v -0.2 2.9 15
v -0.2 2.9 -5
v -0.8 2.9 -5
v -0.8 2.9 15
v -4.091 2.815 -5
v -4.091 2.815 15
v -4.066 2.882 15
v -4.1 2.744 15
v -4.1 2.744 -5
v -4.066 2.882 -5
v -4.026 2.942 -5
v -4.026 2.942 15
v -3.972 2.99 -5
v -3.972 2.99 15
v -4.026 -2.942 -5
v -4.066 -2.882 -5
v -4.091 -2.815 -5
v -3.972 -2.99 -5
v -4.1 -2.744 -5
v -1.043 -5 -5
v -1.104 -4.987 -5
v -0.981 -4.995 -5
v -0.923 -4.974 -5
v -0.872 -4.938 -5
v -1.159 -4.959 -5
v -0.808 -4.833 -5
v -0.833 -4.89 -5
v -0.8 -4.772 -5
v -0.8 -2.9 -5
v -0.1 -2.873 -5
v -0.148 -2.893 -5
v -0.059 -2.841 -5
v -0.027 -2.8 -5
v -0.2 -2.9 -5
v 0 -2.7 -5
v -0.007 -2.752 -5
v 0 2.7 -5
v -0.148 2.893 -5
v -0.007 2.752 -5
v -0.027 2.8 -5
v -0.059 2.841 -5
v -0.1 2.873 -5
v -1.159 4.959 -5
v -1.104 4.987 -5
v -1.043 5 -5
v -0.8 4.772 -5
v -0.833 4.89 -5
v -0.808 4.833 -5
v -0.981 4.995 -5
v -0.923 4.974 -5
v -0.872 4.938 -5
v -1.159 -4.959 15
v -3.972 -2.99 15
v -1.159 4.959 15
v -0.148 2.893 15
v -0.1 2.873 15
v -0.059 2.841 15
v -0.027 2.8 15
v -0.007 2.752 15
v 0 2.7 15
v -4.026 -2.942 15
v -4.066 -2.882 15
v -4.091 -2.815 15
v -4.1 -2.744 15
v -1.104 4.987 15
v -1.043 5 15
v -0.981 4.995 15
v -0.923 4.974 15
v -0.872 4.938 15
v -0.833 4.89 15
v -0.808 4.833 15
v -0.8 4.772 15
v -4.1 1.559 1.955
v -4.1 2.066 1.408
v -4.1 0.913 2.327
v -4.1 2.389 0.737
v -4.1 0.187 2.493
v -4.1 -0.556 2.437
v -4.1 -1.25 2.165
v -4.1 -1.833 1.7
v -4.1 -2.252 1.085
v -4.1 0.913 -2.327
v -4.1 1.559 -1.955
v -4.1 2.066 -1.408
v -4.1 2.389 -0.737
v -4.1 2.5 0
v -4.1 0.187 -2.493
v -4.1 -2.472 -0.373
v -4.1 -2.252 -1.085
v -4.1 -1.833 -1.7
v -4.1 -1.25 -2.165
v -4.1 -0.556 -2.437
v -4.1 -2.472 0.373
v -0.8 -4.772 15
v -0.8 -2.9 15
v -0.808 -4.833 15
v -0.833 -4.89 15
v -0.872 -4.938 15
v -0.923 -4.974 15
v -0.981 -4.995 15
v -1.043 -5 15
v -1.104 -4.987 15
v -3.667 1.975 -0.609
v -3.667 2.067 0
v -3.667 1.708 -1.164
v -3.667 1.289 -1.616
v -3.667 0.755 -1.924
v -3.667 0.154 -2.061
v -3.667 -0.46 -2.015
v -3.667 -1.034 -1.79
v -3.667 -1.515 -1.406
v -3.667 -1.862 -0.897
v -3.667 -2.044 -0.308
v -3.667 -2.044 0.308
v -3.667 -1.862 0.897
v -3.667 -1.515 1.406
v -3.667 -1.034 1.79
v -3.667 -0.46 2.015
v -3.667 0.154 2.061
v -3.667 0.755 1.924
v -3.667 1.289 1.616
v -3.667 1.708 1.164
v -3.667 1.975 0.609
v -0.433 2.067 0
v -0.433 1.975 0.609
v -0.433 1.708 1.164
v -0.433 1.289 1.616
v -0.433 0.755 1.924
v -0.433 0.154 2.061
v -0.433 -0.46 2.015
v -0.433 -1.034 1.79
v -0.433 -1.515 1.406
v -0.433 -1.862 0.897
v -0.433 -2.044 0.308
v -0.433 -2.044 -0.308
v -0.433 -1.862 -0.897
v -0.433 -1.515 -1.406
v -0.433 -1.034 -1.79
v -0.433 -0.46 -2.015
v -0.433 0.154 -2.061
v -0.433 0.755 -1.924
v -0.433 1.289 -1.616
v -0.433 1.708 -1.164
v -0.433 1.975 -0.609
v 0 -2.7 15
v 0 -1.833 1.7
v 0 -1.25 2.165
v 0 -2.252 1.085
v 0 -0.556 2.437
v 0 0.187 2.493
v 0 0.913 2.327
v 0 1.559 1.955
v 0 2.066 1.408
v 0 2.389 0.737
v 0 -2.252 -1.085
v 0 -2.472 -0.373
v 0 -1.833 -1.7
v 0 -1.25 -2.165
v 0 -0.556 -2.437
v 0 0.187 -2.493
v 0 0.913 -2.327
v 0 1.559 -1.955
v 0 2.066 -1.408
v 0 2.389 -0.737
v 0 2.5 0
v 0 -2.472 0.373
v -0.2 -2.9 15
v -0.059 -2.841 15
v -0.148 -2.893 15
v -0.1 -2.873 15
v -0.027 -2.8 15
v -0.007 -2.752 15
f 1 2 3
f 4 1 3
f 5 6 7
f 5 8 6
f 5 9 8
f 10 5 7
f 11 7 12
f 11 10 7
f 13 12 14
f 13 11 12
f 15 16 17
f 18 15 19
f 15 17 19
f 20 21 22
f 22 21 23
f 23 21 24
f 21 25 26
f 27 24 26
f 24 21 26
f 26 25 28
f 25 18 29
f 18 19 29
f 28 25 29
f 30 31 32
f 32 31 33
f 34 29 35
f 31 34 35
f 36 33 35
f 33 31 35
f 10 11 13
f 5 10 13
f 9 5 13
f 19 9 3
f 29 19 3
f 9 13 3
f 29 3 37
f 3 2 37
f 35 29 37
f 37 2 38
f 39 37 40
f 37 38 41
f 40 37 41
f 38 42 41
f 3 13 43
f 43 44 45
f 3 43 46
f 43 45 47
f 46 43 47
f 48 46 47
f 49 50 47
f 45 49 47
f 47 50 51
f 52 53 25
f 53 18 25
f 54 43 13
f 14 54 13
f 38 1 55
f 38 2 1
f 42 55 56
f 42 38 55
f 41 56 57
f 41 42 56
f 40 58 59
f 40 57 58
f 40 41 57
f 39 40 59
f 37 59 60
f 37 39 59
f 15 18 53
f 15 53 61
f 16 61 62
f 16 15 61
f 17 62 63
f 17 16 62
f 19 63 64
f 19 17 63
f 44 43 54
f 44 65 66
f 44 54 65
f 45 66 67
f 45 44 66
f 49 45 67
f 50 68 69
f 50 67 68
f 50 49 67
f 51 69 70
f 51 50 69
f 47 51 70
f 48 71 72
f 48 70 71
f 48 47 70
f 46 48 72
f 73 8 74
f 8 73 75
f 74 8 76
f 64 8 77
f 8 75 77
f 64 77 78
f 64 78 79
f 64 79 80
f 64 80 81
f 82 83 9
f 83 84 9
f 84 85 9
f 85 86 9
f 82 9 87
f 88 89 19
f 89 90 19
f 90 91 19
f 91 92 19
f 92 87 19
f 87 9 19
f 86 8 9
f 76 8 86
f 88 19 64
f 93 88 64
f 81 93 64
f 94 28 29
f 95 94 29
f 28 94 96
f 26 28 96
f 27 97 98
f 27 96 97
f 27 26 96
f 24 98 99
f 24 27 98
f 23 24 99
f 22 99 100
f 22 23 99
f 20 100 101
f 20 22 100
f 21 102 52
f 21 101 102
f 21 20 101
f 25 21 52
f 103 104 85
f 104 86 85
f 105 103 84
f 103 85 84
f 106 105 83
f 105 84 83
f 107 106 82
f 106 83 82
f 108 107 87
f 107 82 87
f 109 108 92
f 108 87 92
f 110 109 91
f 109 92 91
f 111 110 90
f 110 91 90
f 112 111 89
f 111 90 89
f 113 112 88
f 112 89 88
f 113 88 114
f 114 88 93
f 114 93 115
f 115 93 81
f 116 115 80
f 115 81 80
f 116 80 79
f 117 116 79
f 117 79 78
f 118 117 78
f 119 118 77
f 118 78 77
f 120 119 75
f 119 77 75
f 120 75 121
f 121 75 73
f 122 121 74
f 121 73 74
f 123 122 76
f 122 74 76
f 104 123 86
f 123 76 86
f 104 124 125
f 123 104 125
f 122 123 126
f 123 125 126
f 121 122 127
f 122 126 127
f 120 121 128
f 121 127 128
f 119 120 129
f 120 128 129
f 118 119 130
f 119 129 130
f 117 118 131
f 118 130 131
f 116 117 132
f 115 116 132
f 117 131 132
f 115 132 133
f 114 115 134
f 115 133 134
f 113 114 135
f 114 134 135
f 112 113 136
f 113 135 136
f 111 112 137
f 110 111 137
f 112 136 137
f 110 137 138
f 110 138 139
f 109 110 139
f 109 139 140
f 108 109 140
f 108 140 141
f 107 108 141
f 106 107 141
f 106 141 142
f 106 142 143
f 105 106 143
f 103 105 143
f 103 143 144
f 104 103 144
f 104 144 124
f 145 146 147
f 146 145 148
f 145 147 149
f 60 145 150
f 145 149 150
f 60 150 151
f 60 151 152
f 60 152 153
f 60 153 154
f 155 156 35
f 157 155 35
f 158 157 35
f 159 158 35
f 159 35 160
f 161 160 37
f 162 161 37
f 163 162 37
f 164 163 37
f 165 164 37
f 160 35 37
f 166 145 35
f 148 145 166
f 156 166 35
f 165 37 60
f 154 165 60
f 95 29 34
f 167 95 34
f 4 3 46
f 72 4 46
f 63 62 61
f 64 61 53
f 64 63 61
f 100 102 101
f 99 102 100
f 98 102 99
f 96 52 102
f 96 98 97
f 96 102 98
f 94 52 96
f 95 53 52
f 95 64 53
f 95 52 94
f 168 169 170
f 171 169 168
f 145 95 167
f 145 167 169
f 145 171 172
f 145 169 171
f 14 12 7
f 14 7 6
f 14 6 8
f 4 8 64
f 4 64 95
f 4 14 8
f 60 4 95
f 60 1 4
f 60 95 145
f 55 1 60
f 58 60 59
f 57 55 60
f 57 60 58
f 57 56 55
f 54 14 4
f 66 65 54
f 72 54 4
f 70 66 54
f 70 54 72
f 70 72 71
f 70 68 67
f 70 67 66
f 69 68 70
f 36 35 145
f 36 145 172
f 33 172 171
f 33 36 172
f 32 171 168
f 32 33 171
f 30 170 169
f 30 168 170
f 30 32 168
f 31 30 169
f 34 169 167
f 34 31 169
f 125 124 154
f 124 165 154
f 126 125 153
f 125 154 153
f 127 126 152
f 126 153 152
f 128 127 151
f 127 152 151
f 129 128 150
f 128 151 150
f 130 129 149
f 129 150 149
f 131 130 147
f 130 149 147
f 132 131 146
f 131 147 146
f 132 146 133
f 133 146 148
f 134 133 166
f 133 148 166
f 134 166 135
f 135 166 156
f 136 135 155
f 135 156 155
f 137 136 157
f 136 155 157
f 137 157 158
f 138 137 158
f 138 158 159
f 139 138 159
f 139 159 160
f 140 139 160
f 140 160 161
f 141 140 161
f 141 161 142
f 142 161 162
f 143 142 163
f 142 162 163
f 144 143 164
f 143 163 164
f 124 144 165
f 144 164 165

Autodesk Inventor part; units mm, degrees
sketch "Sketch_2" plane through (0, 0, 0) normal (0, 0, 1) x (1, 0, 0)
  arc A0 (-4.1, -2.7438) -> (-3.972, -2.9896) centre (-3.8, -2.7438) ccw
  line L0 (-3.972, -2.9896) -> (-1.1589, -4.9588)
  arc A1 (-1.1589, -4.9588) -> (-0.8, -4.7719) centre (-1.0281, -4.7719) ccw
  line L1 (-0.8, -4.7719) -> (-0.8, -2.9)
  line L2 (-0.8, -2.9) -> (-0.2, -2.9)
  arc A2 (-0.2, -2.9) -> (0, -2.7) centre (-0.2, -2.7) ccw
  line L3 (0, -2.7) -> (0, 2.7)
  arc A3 (0, 2.7) -> (-0.2, 2.9) centre (-0.2, 2.7) ccw
  line L4 (-0.2, 2.9) -> (-0.8, 2.9)
  line L5 (-0.8, 2.9) -> (-0.8, 4.7719)
  arc A4 (-0.8, 4.7719) -> (-1.1589, 4.9588) centre (-1.0281, 4.7719) ccw
  line L6 (-1.1589, 4.9588) -> (-3.972, 2.9896)
  arc A5 (-3.972, 2.9896) -> (-4.1, 2.7438) centre (-3.8, 2.7438) ccw
  line L7 (-4.1, 2.7438) -> (-4.1, -2.7438)
extrude "Extrusion1" add sketch "Sketch_2" along normal blind 15 and the other way blind 5
sketch "Sketch_5" plane through (0, 0, 0) normal (0, 0, 1) x (1, 0, 0)
  line L0 (0, 0) -> (-4.1, 0)
  line L1 (-4.1, 0) -> (-4.1, 2.5)
  line L2 (-4.1, 2.5) -> (-3.667, 2.067)
  line L3 (-3.667, 2.067) -> (-0.433, 2.067)
  line L4 (-0.433, 2.067) -> (0, 2.5)
  line L5 (0, 2.5) -> (0, 0)
  line L6 (0, 0) -> (-4.1, 0)
revolve "Revolution1" cut sketch "Sketch_5" angle 360 about axis through (0, 0, 0) along (1, 0, 0)
thread "Thread1" size "M5x0.8" class "6H" standard "ISO Metric profile" full length
ref_plane "nut_XY" through (0, 0, 0) normal (1, 0, 0) x (0, 0, -1)
ref_plane "nut_YZ" through (0, 0, 0) normal (0, 0, -1) x (0, 1, 0)
ref_plane "nut_ZX" through (0, 0, 0) normal (0, 1, 0) x (1, 0, 0)
ref_plane "to_bolt_XY" through (-4.1, 0, 0) normal (1, 0, 0) x (0, 0, -1)
ref_plane "to_bolt_YZ" through (-4.1, 0, 0) normal (0, 0, -1) x (0, 1, 0)
ref_plane "to_bolt_ZX" through (-4.1, 0, 0) normal (0, 1, 0) x (1, 0, 0)
ref_plane "to_frames_XY" through (-0.8, 0, 0) normal (1, 0, 0) x (0, 0, -1)
ref_plane "to_frames_YZ" through (-0.8, 0, 0) normal (0, 0, -1) x (0, 1, 0)
ref_plane "to_frames_ZX" through (-0.8, 0, 0) normal (0, 1, 0) x (1, 0, 0)
ref_plane "to_lane_XY" through (0, 0, 0) normal (0, 0, 1) x (1, 0, 0)
ref_plane "to_lane_YZ" through (0, 0, 0) normal (1, 0, 0) x (0, 1, 0)
ref_plane "to_lane_ZX" through (0, 0, 0) normal (0, 1, 0) x (0, 0, 1)
properties part number "HNTTSS5-5"
